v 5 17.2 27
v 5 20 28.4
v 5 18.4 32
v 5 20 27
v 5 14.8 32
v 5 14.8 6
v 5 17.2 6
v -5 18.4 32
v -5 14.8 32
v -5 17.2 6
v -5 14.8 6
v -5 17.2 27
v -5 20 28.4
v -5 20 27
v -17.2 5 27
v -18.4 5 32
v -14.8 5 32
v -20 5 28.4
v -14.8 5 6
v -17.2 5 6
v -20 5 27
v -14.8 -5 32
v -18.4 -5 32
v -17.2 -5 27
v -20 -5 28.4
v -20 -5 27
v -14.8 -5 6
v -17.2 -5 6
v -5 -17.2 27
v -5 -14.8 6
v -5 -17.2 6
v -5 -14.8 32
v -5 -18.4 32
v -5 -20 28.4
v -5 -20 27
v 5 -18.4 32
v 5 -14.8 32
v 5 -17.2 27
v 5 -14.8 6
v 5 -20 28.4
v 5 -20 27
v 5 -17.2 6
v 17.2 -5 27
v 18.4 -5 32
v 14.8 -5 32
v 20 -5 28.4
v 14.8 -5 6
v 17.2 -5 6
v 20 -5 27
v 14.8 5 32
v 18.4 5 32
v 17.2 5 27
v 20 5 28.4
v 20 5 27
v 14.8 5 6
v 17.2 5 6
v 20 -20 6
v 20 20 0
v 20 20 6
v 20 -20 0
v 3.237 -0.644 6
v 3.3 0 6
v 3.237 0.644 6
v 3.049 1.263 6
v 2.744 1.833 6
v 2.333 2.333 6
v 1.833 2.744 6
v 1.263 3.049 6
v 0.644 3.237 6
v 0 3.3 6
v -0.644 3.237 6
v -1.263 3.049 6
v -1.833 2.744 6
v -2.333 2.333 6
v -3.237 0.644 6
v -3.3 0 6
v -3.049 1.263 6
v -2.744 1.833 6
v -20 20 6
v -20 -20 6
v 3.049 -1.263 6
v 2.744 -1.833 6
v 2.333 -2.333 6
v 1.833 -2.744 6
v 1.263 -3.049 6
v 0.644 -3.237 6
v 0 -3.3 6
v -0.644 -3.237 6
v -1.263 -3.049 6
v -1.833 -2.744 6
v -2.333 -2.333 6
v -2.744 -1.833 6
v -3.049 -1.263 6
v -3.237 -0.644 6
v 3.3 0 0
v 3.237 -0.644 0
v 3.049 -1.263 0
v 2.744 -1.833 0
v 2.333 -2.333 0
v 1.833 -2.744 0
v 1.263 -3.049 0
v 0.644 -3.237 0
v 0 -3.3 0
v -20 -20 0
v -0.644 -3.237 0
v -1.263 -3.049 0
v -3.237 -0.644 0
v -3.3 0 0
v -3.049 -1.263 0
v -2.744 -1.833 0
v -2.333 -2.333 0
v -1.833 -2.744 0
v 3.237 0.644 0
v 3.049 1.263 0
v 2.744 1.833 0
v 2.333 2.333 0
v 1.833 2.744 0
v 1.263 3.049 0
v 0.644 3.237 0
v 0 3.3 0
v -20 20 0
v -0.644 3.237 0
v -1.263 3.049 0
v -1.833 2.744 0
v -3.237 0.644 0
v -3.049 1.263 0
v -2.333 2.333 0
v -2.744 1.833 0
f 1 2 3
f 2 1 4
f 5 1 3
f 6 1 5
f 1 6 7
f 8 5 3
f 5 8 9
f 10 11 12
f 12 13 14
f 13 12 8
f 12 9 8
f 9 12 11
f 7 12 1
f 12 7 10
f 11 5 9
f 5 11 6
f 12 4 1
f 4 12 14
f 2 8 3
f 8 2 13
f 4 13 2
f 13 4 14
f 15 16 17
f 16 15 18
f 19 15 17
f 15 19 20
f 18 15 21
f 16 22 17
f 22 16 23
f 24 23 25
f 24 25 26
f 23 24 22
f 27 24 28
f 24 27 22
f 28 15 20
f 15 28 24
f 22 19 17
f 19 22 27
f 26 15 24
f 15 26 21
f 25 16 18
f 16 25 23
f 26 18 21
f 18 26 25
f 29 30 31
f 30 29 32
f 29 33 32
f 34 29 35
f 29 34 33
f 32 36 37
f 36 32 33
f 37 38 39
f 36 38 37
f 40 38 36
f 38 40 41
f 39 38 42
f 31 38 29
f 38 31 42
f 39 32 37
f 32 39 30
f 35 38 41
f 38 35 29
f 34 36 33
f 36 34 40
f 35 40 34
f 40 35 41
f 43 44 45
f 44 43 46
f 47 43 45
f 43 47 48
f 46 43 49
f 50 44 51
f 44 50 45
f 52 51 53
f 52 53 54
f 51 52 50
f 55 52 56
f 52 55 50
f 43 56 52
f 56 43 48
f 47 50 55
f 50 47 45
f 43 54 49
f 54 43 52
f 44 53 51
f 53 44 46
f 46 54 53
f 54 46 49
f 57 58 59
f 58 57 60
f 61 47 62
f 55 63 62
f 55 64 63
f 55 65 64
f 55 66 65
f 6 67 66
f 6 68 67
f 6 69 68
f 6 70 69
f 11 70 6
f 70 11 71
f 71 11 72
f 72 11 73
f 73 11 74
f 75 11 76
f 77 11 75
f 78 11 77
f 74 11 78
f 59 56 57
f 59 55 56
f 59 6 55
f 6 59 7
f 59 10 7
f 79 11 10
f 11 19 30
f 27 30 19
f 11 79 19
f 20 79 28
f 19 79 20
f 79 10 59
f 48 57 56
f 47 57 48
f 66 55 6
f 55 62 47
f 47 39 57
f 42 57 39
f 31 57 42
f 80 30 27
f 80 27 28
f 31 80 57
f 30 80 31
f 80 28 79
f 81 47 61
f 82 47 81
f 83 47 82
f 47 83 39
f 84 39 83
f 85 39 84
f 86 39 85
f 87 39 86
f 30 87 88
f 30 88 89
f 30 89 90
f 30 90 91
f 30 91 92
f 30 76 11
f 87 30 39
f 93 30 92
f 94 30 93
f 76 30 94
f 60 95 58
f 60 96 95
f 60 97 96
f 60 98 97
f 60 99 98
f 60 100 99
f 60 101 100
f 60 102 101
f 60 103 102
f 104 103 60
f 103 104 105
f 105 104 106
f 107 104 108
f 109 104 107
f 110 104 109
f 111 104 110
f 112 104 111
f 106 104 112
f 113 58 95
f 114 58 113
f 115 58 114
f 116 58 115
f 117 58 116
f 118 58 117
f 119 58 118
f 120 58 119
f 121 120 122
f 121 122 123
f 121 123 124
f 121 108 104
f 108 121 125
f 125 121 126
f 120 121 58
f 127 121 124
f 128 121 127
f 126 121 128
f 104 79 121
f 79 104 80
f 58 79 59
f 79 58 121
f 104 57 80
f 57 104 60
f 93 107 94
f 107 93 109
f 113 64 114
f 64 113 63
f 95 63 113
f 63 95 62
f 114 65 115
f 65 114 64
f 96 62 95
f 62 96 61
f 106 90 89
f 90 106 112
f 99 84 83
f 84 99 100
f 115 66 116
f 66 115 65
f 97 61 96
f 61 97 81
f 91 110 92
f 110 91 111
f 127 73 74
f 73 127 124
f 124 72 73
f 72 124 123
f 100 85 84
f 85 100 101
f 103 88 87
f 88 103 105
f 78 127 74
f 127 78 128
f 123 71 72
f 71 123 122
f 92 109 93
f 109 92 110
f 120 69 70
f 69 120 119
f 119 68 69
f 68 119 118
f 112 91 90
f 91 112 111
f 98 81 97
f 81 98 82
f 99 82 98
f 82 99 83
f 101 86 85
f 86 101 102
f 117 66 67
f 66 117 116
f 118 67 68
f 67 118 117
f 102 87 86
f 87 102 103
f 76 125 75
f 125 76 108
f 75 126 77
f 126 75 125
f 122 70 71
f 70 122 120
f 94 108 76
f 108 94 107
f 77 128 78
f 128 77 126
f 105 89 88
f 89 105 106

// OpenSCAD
$fn = 32;

// ----------------------------------------------------------------------
// Snap-fit latch: 4 arms, 26 mm tall, 3 mm undercut hooks
// ----------------------------------------------------------------------

// --- parameters (mm) ---
base_d = 40;              // base plate depth
base_h = 6;               // base plate thickness
span = 32;                // distance between opposite arms
arm_t = 2.4;              // arm thickness
arm_d = 10;               // arm width
height = 26;              // free arm length
head_len = 3;             // hook reach
head_h = 5;               // hook height
lead = 1.4;               // lead-in ramp thickness
bore_d = 6.6;             // base fixing bore
top_z = 32;               // height of the arm tips above the base

arms = 4;

difference() {
  union() {
    /* base plate, centred on the arm ring */
    translate([-20, -20, 0]) cube([base_d, base_d, base_h]);
    for (a = [0 : 360 / arms : 359]) rotate([0, 0, a]) {
    /* arm, sunk 0.5 mm into the base */
    translate([-arm_d / 2, span / 2 - arm_t / 2, base_h - 0.5]) cube([arm_d, arm_t, height + 0.5]);
    /* hook: a convex hull of a tall inner block and a thin outer lip
       gives a flat undercut below and a lead-in ramp on top */
    hull() {
      translate([-arm_d / 2, span / 2 + arm_t / 2 - 0.6, top_z - head_h]) cube([arm_d, lead + 0.4, head_h]);
      translate([-arm_d / 2, span / 2 + arm_t / 2 - 0.2, top_z - head_h]) cube([arm_d, head_len, lead]);
    }
    }
  }
  translate([0, 0, -2.5]) cylinder(h = base_h + 5, d = bore_d);
}
